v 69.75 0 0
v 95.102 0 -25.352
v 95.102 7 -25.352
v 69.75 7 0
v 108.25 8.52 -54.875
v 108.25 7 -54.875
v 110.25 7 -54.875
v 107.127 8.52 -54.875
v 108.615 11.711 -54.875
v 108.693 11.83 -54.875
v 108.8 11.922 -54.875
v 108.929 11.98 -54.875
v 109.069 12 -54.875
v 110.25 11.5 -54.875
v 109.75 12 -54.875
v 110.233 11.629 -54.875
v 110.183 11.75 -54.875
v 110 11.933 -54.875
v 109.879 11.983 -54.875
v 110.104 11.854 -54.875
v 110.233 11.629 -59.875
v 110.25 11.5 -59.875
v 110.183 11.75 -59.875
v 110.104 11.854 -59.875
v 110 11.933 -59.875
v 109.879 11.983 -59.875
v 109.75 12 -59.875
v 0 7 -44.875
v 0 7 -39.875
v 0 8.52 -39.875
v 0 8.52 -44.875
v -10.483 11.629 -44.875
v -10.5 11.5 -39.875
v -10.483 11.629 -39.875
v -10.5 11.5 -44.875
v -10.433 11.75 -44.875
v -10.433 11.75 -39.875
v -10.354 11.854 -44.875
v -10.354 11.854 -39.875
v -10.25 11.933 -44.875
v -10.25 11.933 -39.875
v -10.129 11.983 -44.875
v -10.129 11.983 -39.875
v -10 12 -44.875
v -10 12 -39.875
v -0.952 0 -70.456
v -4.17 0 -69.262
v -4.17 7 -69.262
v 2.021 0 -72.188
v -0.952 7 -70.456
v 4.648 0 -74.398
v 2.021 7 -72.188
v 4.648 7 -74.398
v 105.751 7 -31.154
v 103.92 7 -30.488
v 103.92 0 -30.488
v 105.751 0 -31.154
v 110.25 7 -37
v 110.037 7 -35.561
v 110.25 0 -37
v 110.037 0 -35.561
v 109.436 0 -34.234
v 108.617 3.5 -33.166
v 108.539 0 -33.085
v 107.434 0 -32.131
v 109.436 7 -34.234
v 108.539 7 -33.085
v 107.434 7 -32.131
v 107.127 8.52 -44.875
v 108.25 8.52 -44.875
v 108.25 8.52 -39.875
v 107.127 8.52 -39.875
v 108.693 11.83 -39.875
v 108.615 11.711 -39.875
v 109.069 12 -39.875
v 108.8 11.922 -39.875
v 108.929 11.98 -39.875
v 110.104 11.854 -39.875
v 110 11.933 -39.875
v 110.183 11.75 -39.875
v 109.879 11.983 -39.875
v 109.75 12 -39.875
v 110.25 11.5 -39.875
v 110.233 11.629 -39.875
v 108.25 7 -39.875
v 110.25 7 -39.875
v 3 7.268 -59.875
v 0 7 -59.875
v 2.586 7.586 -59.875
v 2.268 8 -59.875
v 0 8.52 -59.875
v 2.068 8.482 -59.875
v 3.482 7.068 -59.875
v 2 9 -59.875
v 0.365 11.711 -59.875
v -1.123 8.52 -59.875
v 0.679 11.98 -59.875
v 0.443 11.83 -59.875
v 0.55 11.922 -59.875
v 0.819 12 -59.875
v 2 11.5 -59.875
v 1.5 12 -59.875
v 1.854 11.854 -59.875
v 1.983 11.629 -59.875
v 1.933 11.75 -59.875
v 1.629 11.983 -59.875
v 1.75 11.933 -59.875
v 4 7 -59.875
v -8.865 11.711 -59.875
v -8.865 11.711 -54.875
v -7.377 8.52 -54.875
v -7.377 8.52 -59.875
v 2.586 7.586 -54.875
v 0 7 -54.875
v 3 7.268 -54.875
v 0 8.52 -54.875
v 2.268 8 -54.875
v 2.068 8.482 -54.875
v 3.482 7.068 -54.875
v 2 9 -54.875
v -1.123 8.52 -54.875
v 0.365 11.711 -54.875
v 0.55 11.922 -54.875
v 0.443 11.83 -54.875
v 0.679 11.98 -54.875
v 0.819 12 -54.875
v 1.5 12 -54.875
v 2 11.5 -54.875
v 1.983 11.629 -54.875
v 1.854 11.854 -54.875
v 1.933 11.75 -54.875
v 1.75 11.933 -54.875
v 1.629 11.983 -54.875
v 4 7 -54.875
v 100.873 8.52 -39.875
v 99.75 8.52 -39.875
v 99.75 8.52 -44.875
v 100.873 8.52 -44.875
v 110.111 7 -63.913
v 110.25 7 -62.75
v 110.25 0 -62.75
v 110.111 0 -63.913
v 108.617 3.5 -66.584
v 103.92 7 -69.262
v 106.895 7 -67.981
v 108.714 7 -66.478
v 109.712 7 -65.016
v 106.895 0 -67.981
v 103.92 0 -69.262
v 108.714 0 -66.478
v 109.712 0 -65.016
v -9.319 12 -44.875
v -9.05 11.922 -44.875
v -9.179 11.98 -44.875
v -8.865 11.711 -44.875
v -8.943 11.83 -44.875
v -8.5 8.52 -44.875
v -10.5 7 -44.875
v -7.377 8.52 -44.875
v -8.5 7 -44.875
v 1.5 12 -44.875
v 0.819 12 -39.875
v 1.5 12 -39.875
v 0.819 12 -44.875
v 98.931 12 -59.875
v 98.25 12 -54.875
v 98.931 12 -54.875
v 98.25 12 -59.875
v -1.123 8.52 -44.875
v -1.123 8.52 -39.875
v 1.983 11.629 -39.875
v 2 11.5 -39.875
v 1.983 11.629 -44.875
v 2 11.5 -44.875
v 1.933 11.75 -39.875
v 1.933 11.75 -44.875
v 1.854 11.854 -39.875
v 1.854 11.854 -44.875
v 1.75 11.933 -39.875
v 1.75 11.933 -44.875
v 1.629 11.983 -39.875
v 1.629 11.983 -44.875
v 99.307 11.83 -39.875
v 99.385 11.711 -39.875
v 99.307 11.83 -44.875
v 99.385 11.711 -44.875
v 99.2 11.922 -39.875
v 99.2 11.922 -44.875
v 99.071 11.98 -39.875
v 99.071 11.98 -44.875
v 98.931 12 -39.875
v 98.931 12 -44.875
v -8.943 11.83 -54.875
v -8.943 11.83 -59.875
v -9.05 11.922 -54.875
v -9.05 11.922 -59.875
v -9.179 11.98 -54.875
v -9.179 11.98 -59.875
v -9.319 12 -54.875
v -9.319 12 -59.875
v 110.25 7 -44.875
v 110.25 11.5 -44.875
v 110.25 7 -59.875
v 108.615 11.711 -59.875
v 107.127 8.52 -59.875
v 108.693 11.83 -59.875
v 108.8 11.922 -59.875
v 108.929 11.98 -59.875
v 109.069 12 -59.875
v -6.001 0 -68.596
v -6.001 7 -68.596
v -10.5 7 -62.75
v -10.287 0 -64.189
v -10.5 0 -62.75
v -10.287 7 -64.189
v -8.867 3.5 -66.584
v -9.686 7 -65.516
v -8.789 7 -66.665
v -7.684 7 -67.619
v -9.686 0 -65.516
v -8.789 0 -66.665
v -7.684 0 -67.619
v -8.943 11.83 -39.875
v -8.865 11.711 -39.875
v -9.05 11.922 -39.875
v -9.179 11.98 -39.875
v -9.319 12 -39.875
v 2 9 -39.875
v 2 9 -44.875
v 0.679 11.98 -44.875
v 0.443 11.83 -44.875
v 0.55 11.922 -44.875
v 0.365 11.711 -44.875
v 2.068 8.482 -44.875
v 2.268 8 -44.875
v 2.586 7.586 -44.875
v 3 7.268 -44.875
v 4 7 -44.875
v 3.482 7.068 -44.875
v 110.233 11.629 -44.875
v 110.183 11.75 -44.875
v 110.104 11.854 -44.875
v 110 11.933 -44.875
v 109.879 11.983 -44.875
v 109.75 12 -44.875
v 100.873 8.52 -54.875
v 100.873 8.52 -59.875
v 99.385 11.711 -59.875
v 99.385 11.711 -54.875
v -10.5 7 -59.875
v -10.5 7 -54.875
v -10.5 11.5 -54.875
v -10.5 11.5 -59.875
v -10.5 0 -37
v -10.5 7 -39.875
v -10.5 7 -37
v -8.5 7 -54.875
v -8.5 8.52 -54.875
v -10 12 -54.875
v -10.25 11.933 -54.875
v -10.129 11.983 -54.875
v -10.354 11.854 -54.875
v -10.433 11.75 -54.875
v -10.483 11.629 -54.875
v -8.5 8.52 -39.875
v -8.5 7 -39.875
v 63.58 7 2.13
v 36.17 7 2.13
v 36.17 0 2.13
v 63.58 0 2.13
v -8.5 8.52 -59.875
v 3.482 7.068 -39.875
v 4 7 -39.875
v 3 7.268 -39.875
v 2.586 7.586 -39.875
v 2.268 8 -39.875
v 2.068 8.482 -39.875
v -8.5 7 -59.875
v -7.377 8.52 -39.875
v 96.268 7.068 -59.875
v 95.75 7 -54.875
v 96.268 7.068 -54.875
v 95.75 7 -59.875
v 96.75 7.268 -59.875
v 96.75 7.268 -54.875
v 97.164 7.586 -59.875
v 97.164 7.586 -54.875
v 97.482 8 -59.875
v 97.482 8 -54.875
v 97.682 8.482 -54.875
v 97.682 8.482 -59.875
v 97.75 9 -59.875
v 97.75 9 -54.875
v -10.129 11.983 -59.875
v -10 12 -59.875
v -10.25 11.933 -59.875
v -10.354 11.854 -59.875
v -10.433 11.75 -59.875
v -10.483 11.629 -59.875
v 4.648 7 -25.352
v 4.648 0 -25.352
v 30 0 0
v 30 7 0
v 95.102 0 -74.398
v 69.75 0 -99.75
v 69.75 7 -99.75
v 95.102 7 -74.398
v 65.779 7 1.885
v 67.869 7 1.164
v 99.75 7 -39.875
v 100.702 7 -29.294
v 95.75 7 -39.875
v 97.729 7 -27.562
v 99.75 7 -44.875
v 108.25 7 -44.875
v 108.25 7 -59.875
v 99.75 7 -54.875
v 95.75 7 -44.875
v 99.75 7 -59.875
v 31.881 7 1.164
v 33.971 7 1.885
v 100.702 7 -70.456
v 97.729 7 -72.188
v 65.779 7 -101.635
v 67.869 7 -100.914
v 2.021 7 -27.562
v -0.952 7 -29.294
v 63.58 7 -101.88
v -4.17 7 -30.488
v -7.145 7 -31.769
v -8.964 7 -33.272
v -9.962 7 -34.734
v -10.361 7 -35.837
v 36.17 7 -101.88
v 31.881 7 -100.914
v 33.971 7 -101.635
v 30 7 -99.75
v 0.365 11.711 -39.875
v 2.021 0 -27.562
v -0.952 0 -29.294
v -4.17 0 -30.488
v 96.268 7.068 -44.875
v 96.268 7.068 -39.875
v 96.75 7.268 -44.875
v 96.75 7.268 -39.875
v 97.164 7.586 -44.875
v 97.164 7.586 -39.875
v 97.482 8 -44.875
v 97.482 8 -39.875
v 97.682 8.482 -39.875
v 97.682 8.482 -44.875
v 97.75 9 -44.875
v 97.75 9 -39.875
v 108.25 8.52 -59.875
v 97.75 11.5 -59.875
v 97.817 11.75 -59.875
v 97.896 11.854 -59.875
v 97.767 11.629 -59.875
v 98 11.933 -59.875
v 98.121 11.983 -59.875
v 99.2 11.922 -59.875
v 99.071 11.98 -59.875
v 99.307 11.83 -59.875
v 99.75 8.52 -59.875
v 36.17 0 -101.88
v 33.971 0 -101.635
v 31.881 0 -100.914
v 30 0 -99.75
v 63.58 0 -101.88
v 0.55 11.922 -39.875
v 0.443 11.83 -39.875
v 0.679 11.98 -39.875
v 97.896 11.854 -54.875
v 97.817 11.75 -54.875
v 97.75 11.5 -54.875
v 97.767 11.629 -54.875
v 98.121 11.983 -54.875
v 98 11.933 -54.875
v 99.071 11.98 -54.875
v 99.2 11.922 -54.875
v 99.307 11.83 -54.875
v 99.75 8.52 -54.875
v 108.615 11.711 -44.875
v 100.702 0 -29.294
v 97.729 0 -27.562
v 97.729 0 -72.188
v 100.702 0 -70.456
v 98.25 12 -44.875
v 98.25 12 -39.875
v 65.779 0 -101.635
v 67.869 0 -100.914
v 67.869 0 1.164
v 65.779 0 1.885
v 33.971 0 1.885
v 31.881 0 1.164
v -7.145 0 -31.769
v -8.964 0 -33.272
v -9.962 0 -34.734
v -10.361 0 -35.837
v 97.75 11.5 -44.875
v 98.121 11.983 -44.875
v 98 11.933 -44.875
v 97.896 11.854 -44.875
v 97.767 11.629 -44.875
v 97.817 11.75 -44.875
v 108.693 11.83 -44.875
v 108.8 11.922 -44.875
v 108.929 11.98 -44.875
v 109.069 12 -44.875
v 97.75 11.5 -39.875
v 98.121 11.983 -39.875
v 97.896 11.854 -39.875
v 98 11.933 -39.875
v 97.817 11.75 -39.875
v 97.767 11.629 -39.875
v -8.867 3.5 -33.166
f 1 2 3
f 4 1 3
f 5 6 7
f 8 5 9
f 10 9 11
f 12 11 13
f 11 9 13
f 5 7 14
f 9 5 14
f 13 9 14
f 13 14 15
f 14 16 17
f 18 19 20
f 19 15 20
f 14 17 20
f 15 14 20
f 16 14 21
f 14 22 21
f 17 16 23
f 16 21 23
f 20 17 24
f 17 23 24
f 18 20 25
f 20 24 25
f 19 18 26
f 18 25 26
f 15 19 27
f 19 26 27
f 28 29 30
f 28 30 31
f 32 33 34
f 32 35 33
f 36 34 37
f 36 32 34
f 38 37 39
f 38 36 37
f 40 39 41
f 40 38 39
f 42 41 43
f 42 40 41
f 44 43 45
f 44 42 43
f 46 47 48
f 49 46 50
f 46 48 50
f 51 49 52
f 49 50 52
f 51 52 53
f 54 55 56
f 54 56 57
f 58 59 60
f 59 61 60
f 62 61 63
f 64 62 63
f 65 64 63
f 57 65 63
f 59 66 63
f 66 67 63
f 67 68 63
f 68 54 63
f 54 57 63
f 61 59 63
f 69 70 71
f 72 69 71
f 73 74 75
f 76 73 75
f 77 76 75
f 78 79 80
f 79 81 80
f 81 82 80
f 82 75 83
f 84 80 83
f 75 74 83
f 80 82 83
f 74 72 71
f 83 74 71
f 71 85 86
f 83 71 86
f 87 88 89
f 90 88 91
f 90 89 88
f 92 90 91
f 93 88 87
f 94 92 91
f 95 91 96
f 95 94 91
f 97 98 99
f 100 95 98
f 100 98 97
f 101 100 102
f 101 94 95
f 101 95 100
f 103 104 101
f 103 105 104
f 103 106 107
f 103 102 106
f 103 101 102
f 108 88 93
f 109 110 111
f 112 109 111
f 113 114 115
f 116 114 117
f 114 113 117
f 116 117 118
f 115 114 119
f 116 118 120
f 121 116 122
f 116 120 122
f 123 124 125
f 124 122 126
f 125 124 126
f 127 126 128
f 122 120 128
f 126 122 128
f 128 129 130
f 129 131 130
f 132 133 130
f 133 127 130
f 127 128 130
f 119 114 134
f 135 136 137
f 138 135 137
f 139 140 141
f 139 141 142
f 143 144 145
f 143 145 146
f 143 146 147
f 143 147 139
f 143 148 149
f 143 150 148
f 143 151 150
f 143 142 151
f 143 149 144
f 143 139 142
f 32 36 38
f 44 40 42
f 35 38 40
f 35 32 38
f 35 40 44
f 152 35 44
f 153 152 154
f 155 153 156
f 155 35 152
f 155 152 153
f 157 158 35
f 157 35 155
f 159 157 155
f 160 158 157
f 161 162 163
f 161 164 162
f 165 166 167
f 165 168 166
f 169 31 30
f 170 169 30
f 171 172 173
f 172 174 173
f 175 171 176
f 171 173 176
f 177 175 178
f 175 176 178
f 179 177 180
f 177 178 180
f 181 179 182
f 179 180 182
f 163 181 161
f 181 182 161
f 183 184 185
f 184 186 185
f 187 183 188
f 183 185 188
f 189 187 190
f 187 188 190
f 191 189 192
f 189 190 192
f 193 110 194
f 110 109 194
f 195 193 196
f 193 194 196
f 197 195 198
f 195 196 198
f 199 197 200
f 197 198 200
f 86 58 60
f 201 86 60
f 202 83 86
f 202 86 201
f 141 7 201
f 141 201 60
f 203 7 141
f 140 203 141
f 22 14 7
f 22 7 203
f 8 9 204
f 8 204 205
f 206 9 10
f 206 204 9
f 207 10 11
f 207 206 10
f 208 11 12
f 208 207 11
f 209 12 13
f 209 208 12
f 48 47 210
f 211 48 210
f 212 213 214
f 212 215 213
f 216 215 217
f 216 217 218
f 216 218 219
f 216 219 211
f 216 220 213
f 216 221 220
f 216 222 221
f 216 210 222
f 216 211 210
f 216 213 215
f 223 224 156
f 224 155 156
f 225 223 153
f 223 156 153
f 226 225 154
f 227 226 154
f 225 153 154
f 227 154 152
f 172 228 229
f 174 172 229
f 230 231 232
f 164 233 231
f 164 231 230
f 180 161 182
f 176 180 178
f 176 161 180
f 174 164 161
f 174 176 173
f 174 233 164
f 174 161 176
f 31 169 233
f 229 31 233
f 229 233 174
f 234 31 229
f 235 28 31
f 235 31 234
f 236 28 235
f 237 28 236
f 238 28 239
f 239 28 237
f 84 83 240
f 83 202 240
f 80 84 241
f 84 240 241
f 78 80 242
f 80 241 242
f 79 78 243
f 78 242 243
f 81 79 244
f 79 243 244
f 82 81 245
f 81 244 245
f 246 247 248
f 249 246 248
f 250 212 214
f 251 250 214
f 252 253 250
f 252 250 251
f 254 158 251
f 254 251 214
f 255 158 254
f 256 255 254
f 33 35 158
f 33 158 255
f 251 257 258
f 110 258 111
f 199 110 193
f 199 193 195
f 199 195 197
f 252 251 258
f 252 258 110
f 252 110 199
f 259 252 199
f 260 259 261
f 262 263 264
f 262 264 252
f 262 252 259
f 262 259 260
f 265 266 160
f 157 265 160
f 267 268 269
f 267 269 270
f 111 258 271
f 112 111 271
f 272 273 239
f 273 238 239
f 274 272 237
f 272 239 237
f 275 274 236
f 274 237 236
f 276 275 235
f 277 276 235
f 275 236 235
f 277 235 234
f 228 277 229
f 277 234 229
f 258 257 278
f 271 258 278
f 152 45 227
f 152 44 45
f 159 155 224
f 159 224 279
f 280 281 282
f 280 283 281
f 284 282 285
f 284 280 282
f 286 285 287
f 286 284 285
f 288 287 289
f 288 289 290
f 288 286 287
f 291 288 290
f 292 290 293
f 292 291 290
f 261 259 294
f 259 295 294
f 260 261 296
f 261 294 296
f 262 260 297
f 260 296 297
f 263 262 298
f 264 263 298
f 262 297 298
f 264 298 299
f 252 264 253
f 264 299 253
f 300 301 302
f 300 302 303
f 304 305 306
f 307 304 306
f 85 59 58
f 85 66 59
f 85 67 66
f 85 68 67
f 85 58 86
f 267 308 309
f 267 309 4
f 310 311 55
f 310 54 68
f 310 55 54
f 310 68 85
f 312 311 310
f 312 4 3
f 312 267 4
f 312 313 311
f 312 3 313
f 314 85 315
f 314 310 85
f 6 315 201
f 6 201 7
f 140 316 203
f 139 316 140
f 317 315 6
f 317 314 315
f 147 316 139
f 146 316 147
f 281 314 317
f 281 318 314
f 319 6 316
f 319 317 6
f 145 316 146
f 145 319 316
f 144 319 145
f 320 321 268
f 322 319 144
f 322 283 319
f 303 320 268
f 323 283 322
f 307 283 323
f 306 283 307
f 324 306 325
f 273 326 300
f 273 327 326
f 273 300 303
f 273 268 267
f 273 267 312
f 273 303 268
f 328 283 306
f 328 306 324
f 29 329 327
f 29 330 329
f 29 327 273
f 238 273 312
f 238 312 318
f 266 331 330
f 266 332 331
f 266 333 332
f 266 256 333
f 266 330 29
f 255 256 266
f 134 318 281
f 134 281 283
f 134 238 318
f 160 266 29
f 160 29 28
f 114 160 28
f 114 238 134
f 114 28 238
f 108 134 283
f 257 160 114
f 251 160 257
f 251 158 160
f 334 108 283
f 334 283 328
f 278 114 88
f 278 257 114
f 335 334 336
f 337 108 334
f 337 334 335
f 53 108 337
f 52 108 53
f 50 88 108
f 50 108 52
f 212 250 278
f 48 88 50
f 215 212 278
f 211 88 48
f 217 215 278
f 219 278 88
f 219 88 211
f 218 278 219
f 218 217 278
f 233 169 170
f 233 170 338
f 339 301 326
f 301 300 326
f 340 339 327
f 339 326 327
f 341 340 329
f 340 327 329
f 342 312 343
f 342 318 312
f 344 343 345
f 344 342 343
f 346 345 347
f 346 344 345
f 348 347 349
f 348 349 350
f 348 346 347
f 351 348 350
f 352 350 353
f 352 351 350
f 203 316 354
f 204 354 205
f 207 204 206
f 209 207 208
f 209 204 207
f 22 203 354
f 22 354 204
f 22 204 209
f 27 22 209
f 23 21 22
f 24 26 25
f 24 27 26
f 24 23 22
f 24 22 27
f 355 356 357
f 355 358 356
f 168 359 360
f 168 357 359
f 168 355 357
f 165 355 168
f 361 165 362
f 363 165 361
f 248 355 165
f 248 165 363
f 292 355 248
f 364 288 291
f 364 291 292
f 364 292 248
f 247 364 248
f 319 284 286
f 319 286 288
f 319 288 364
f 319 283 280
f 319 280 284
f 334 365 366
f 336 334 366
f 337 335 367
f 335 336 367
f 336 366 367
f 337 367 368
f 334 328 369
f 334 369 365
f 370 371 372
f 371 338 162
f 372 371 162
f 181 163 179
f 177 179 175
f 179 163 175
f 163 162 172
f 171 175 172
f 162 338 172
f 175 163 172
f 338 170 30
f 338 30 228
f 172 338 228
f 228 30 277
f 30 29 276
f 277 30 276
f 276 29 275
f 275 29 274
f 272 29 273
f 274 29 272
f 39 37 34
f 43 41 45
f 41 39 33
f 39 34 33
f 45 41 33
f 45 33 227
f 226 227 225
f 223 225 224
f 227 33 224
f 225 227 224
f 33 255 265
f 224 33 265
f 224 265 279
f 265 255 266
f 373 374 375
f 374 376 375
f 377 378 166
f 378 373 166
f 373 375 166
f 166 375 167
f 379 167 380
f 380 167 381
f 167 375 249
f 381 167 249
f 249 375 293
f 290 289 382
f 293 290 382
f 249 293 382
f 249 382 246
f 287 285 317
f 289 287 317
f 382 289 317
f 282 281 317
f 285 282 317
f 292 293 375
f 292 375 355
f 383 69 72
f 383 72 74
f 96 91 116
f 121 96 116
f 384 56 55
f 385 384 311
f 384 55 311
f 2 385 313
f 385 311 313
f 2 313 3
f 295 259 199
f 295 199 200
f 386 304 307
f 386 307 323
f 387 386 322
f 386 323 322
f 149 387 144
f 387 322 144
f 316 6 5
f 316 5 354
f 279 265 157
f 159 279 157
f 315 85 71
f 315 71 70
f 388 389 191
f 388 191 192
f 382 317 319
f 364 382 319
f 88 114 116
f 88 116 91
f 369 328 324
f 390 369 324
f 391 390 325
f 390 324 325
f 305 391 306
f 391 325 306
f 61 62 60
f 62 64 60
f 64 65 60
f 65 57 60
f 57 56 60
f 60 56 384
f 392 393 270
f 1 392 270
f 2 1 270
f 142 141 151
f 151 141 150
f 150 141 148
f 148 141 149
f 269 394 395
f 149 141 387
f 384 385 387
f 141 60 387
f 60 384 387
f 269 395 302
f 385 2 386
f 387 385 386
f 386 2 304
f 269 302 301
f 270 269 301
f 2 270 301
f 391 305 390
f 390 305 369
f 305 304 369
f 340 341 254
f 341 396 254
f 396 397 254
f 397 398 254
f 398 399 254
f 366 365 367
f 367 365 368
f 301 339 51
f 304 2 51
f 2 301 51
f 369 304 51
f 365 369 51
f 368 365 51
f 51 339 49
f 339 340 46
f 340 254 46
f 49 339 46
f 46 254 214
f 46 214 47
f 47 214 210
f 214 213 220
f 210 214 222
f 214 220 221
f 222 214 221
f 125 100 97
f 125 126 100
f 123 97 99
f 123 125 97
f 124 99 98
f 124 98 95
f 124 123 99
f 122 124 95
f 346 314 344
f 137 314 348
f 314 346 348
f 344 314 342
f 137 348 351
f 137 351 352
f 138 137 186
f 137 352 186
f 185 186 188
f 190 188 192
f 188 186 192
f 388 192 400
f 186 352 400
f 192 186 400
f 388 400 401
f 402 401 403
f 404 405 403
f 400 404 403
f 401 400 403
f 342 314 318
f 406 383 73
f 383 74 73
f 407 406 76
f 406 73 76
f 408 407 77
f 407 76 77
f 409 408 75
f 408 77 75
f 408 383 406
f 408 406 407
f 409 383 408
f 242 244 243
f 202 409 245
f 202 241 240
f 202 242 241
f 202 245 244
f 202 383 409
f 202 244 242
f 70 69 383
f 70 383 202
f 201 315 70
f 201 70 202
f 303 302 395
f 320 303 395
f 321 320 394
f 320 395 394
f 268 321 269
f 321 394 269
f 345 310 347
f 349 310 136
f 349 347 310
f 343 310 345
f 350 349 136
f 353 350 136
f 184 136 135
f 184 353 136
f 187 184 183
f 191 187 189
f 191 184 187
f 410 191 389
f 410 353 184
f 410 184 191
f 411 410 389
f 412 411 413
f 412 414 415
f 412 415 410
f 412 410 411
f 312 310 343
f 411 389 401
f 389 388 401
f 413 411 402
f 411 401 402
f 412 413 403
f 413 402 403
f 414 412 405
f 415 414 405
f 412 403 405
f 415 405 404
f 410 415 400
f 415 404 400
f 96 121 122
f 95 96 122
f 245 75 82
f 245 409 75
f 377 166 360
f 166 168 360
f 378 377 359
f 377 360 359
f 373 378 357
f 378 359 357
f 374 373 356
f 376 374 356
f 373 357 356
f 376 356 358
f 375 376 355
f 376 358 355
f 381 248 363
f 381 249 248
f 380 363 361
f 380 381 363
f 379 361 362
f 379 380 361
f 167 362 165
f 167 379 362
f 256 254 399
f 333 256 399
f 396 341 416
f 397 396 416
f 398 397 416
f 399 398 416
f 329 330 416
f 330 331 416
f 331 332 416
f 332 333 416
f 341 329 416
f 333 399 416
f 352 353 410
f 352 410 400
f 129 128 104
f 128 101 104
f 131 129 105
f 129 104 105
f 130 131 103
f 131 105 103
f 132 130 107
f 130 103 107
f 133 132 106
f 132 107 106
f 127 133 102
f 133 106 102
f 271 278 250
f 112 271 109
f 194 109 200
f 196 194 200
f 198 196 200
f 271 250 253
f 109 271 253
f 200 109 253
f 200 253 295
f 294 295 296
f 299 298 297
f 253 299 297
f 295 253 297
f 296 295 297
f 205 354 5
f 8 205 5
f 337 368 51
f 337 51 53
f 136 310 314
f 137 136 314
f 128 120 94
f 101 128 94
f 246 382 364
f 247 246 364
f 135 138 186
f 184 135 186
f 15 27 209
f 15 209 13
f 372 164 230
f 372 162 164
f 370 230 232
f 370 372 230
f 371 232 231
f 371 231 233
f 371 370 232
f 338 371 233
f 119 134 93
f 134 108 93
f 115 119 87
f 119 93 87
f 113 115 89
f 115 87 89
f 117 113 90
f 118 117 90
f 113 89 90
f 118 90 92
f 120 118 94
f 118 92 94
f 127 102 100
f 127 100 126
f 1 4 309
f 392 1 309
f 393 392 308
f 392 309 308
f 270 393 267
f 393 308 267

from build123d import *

# Parameters (mm, degrees)
SKETCH1_W            = 99.75
SKETCH1_H            = 99.75
BOSS_EXTRUDE5_DEPTH  = 7
CHAMFER2_SIZE        = 30
SKETCH6_W            = 39.75
SKETCH6_H            = 7
BOSS_EXTRUDE7_DEPTH  = 2.13
SKETCH8_W            = 39.75
SKETCH8_H            = 7
BOSS_EXTRUDE10_DEPTH = 2.13
SKETCH12_W           = 39.75
SKETCH12_H           = 7
BOSS_EXTRUDE14_DEPTH = 10.5
SKETCH14_W           = 39.75
SKETCH14_H           = 7
BOSS_EXTRUDE16_DEPTH = 10.5
SKETCH15_W           = 2
SKETCH15_H           = 5
BOSS_EXTRUDE17_DEPTH = 5
FILLET5_R            = 2
SKETCH16_W           = 5
SKETCH16_H           = 3.48
BOSS_EXTRUDE18_DEPTH = 2
SKETCH17_W           = 5
SKETCH17_H           = 3.48
BOSS_EXTRUDE19_DEPTH = 2
SKETCH18_W           = 5
SKETCH18_H           = 3.48
BOSS_EXTRUDE20_DEPTH = 2
SKETCH19_W           = 5
SKETCH19_H           = 3.48
BOSS_EXTRUDE21_DEPTH = 2
CHAMFER6_SIZE        = 5.361267301
CHAMFER6_SIZE_2      = 2.5
CHAMFER7_SIZE        = 5.361267301
CHAMFER7_SIZE_2      = 2.5
FILLET6_R            = 0.5
FILLET7_SIZE         = 10
FILLET7_SIZE_2       = 7
FILLET8_R            = 20
FILLET9_R            = 10


with BuildPart() as part:
    # Sketch1 → Boss-Extrude5 (new body)
    with BuildSketch(Plane(origin=(0, 0, 0), x_dir=(1, 0, 0), z_dir=(0, 1, 0))):
        with Locations((49.875, 49.875)):
            Rectangle(SKETCH1_W, SKETCH1_H)
    extrude(amount=BOSS_EXTRUDE5_DEPTH)

    # Chamfer2
    chamfer2_edges = [part.edges().sort_by_distance(p)[0] for p in [
        (0, 3.5, -99.75),
        (99.75, 3.5, -99.75),
        (99.75, 3.5, 0),
        (0, 3.5, 0),
    ]]
    chamfer(chamfer2_edges, length=CHAMFER2_SIZE)

    # Sketch6 → Boss-Extrude7 (add)
    with BuildSketch(Plane.XY):
        with Locations((49.875, 3.5)):
            Rectangle(SKETCH6_W, SKETCH6_H)
    extrude(amount=BOSS_EXTRUDE7_DEPTH)

    # Sketch8 → Boss-Extrude10 (add)
    with BuildSketch(Plane(origin=(0, 0, -99.75), x_dir=(-1, 0, 0), z_dir=(0, 0, -1))):
        with Locations((-49.875, 3.5)):
            Rectangle(SKETCH8_W, SKETCH8_H)
    extrude(amount=BOSS_EXTRUDE10_DEPTH)

    # Sketch12 → Boss-Extrude14 (add)
    with BuildSketch(Plane.ZY):
        with Locations((-49.875, 3.5)):
            Rectangle(SKETCH12_W, SKETCH12_H)
    extrude(amount=BOSS_EXTRUDE14_DEPTH)

    # Sketch14 → Boss-Extrude16 (add)
    with BuildSketch(Plane(origin=(99.75, 0, 0), x_dir=(0, 0, -1), z_dir=(1, 0, 0))):
        with Locations((49.875, 3.5)):
            Rectangle(SKETCH14_W, SKETCH14_H)
    extrude(amount=BOSS_EXTRUDE16_DEPTH)

    # Sketch15 → Boss-Extrude17 (add)
    with BuildSketch(Plane(origin=(0, 7, 0), x_dir=(1, 0, 0), z_dir=(0, 1, 0))):
        with Locations((1, 42.375)):
            Rectangle(SKETCH15_W, SKETCH15_H)
        with Locations((1, 57.375)):
            Rectangle(SKETCH15_W, SKETCH15_H)
        with Locations((-9.5, 57.375)):
            Rectangle(SKETCH15_W, SKETCH15_H)
        with Locations((-9.5, 42.375)):
            Rectangle(SKETCH15_W, SKETCH15_H)
        with Locations((109.25, 42.375)):
            Rectangle(SKETCH15_W, SKETCH15_H)
        with Locations((109.25, 57.375)):
            Rectangle(SKETCH15_W, SKETCH15_H)
        with Locations((98.75, 57.375)):
            Rectangle(SKETCH15_W, SKETCH15_H)
        with Locations((98.75, 42.375)):
            Rectangle(SKETCH15_W, SKETCH15_H)
    extrude(amount=BOSS_EXTRUDE17_DEPTH)

    # Fillet5
    fillet5_edges = [part.edges().sort_by_distance(p)[0] for p in [
        (2, 7, -57.375),
        (97.75, 7, -57.375),
        (97.75, 7, -42.375),
        (2, 7, -42.375),
    ]]
    fillet(fillet5_edges, radius=FILLET5_R)

    # Sketch16 → Boss-Extrude18 (add)
    with BuildSketch(Plane(origin=(99.75, 0, 0), x_dir=(0, 0, -1), z_dir=(1, 0, 0))):
        with Locations((42.375, 10.26)):
            Rectangle(SKETCH16_W, SKETCH16_H)
        with Locations((57.375, 10.26)):
            Rectangle(SKETCH16_W, SKETCH16_H)
    extrude(amount=BOSS_EXTRUDE18_DEPTH)

    # Sketch17 → Boss-Extrude19 (add)
    with BuildSketch(Plane.ZY.offset(-108.25)):
        with Locations((-57.375, 10.26)):
            Rectangle(SKETCH17_W, SKETCH17_H)
        with Locations((-42.375, 10.26)):
            Rectangle(SKETCH17_W, SKETCH17_H)
    extrude(amount=BOSS_EXTRUDE19_DEPTH)

    # Sketch18 → Boss-Extrude20 (add)
    with BuildSketch(Plane.ZY):
        with Locations((-57.375, 10.26)):
            Rectangle(SKETCH18_W, SKETCH18_H)
        with Locations((-42.375, 10.26)):
            Rectangle(SKETCH18_W, SKETCH18_H)
    extrude(amount=BOSS_EXTRUDE20_DEPTH)

    # Sketch19 → Boss-Extrude21 (add)
    with BuildSketch(Plane(origin=(-8.5, 0, 0), x_dir=(0, 0, -1), z_dir=(1, 0, 0))):
        with Locations((57.375, 10.26)):
            Rectangle(SKETCH19_W, SKETCH19_H)
        with Locations((42.375, 10.26)):
            Rectangle(SKETCH19_W, SKETCH19_H)
    extrude(amount=BOSS_EXTRUDE21_DEPTH)

    # Chamfer6
    # the kernel refuses this chamfer: 5.361267301, 2.5 mm, written as the material it takes off along each edge
    with BuildSketch(Plane(origin=(106.25, 12, -44.875), x_dir=(-0.016311164131111014, -0.9998669641130703, 0), z_dir=(0, 0, 1))) as chamfer6_piece_1_section:
        Polygon((CHAMFER6_SIZE * 0.999866964164, CHAMFER6_SIZE * 0.0163111641319), (-CHAMFER6_SIZE_2 * 0.0163111641311, CHAMFER6_SIZE_2 * 0.999866964113), (0, 0), align=None)
    chamfer6_piece_1 = extrude(amount=18.890912073, mode=Mode.PRIVATE)
    chamfer6_piece_1 = split(chamfer6_piece_1, bisect_by=Plane(origin=(107.159289271, 8.52, -42.375), z_dir=(0, 1, 0)), keep=Keep.TOP, mode=Mode.PRIVATE)
    add(chamfer6_piece_1, mode=Mode.SUBTRACT)

    # Chamfer7
    # the kernel refuses this chamfer: 5.361267301, 2.5 mm, written as the material it takes off along each edge
    with BuildSketch(Plane(origin=(101.75, 12, -58.765912073), x_dir=(0.016311164131111014, -0.9998669641130703, 0), z_dir=(0, 0, 1))) as chamfer7_piece_1_section:
        Polygon((CHAMFER7_SIZE * 0.999866964164, -CHAMFER7_SIZE * 0.0163111641319), (-CHAMFER7_SIZE_2 * 0.0163111641311, -CHAMFER7_SIZE_2 * 0.999866964113), (0, 0), align=None)
    chamfer7_piece_1 = extrude(amount=32.781824147, mode=Mode.PRIVATE)
    chamfer7_piece_1 = split(chamfer7_piece_1, bisect_by=Plane(origin=(100.840710729, 8.52, -56.820456037), z_dir=(0, 1, 0)), keep=Keep.TOP, mode=Mode.PRIVATE)
    add(chamfer7_piece_1, mode=Mode.SUBTRACT)
    with BuildSketch(Plane(origin=(101.75, 12, -40.984087927), x_dir=(0.016311164131111014, -0.9998669641130703, 0), z_dir=(0, 0, -1))) as chamfer7_piece_2_section:
        Polygon((CHAMFER7_SIZE * 0.999866964164, CHAMFER7_SIZE * 0.0163111641319), (-CHAMFER7_SIZE_2 * 0.0163111641311, CHAMFER7_SIZE_2 * 0.999866964113), (0, 0), align=None)
    chamfer7_piece_2 = extrude(amount=32.781824147, mode=Mode.PRIVATE)
    chamfer7_piece_2 = split(chamfer7_piece_2, bisect_by=Plane(origin=(100.840710729, 8.52, -42.929543963), z_dir=(0, 1, 0)), keep=Keep.TOP, mode=Mode.PRIVATE)
    add(chamfer7_piece_2, mode=Mode.SUBTRACT)
    with BuildSketch(Plane(origin=(106.25, 12, -40.984087927), x_dir=(0.9971975577536774, 0.07481330637060021, 0), z_dir=(0, 0, -1))) as chamfer7_piece_3_section:
        Polygon((CHAMFER7_SIZE_2 * 0.997197557754, CHAMFER7_SIZE_2 * 0.0748133063706), (-CHAMFER7_SIZE * 0.0748133063744, CHAMFER7_SIZE * 0.997197557805), (0, 0), align=None)
    chamfer7_piece_3 = extrude(amount=32.781824147, mode=Mode.PRIVATE)
    chamfer7_piece_3 = split(chamfer7_piece_3, bisect_by=Plane(origin=(107.159289271, 8.52, -57.375), z_dir=(0, 1, 0)), keep=Keep.TOP, mode=Mode.PRIVATE)
    add(chamfer7_piece_3, mode=Mode.SUBTRACT)
    with BuildSketch(Plane(origin=(-2, 12, -40.984087927), x_dir=(-0.016311164131110216, -0.9998669641130703, 0), z_dir=(0, 0, -1))) as chamfer7_piece_4_section:
        Polygon((CHAMFER7_SIZE * 0.999866964164, -CHAMFER7_SIZE * 0.0163111641319), (-CHAMFER7_SIZE_2 * 0.0163111641311, -CHAMFER7_SIZE_2 * 0.999866964113), (0, 0), align=None)
    chamfer7_piece_4 = extrude(amount=32.781824147, mode=Mode.PRIVATE)
    chamfer7_piece_4 = split(chamfer7_piece_4, bisect_by=Plane(origin=(-1.090710729, 8.52, -42.929543963), z_dir=(0, 1, 0)), keep=Keep.TOP, mode=Mode.PRIVATE)
    add(chamfer7_piece_4, mode=Mode.SUBTRACT)
    with BuildSketch(Plane(origin=(-2, 12, -58.765912073), x_dir=(-0.016311164131110216, -0.9998669641130703, 0), z_dir=(0, 0, 1))) as chamfer7_piece_5_section:
        Polygon((CHAMFER7_SIZE * 0.999866964164, CHAMFER7_SIZE * 0.0163111641319), (-CHAMFER7_SIZE_2 * 0.0163111641311, CHAMFER7_SIZE_2 * 0.999866964113), (0, 0), align=None)
    chamfer7_piece_5 = extrude(amount=32.781824147, mode=Mode.PRIVATE)
    chamfer7_piece_5 = split(chamfer7_piece_5, bisect_by=Plane(origin=(-1.090710729, 8.52, -56.820456037), z_dir=(0, 1, 0)), keep=Keep.TOP, mode=Mode.PRIVATE)
    add(chamfer7_piece_5, mode=Mode.SUBTRACT)
    with BuildSketch(Plane(origin=(-6.5, 12, -40.984087927), x_dir=(-0.9971975577536774, 0.07481330637060031, 0), z_dir=(0, 0, -1))) as chamfer7_piece_6_section:
        Polygon((CHAMFER7_SIZE_2 * 0.997197557754, -CHAMFER7_SIZE_2 * 0.0748133063706), (-CHAMFER7_SIZE * 0.0748133063744, -CHAMFER7_SIZE * 0.997197557805), (0, 0), align=None)
    chamfer7_piece_6 = extrude(amount=32.781824147, mode=Mode.PRIVATE)
    chamfer7_piece_6 = split(chamfer7_piece_6, bisect_by=Plane(origin=(-7.409289271, 8.52, -42.929543963), z_dir=(0, 1, 0)), keep=Keep.TOP, mode=Mode.PRIVATE)
    add(chamfer7_piece_6, mode=Mode.SUBTRACT)
    with BuildSketch(Plane(origin=(-6.5, 12, -25.984087927), x_dir=(-0.9971975577536774, 0.07481330637060031, 0), z_dir=(0, 0, -1))) as chamfer7_piece_7_section:
        Polygon((CHAMFER7_SIZE_2 * 0.997197557754, -CHAMFER7_SIZE_2 * 0.0748133063706), (-CHAMFER7_SIZE * 0.0748133063744, -CHAMFER7_SIZE * 0.997197557805), (0, 0), align=None)
    chamfer7_piece_7 = extrude(amount=32.781824147, mode=Mode.PRIVATE)
    chamfer7_piece_7 = split(chamfer7_piece_7, bisect_by=Plane(origin=(-7.409289271, 8.52, -42.375), z_dir=(0, 1, 0)), keep=Keep.TOP, mode=Mode.PRIVATE)
    add(chamfer7_piece_7, mode=Mode.SUBTRACT)

    # Fillet6
    fillet6_edges = [part.edges().sort_by_distance(p)[0] for p in [
        (2, 12, -57.375),
        (-10.5, 12, -57.375),
        (-10.5, 12, -42.375),
        (110.25, 12, -42.375),
        (110.25, 12, -57.375),
        (97.75, 12, -57.375),
        (97.75, 12, -42.375),
        (108.75, 12, -42.375),
        (-9, 12, -42.375),
        (-9, 12, -57.375),
        (0.5, 12, -57.375),
        (0.5, 12, -42.375),
        (99.25, 12, -42.375),
        (99.25, 12, -57.375),
        (108.75, 12, -57.375),
        (2, 12, -42.375),
    ]]
    fillet(fillet6_edges, radius=FILLET6_R)

    # Fillet7
    # an asymmetric fillet: 10, 7 mm, written as the material it takes off along each edge
    with BuildSketch(Plane(origin=(-10.5, 32, -69.75), x_dir=(1, 0, 0), z_dir=(0, -1, 0))) as fillet7_piece_1:
        with BuildLine():
            Bezier((FILLET7_SIZE, 0), (0, 0), (0, FILLET7_SIZE_2), weights=[1, 0.707106781, 1])
            Line((0, FILLET7_SIZE_2), (0, 0))
            Line((0, 0), (FILLET7_SIZE, 0))
        make_face()
    extrude(amount=57, mode=Mode.SUBTRACT)
    with BuildSketch(Plane(origin=(-10.5, -25, -30), x_dir=(0, 0, -1), z_dir=(0, 1, 0))) as fillet7_piece_2:
        with BuildLine():
            Bezier((FILLET7_SIZE_2, 0), (0, 0), (0, -FILLET7_SIZE), weights=[1, 0.707106781, 1])
            Line((0, -FILLET7_SIZE), (0, 0))
            Line((0, 0), (FILLET7_SIZE_2, 0))
        make_face()
    extrude(amount=57, mode=Mode.SUBTRACT)
    with BuildSketch(Plane(origin=(110.25, 32, -69.75), x_dir=(0, 0, 1), z_dir=(0, -1, 0))) as fillet7_piece_3:
        with BuildLine():
            Bezier((FILLET7_SIZE_2, 0), (0, 0), (0, FILLET7_SIZE), weights=[1, 0.707106781, 1])
            Line((0, FILLET7_SIZE), (0, 0))
            Line((0, 0), (FILLET7_SIZE_2, 0))
        make_face()
    extrude(amount=57, mode=Mode.SUBTRACT)
    with BuildSketch(Plane(origin=(110.25, -25, -30), x_dir=(-1, 0, 0), z_dir=(0, 1, 0))) as fillet7_piece_4:
        with BuildLine():
            Bezier((FILLET7_SIZE, 0), (0, 0), (0, -FILLET7_SIZE_2), weights=[1, 0.707106781, 1])
            Line((0, -FILLET7_SIZE_2), (0, 0))
            Line((0, 0), (FILLET7_SIZE, 0))
        make_face()
    extrude(amount=57, mode=Mode.SUBTRACT)

    # Fillet8
    fillet8_edges = [part.edges().sort_by_distance(p)[0] for p in [
        (0, 3.5, -30),
        (0, 3.5, -69.75),
        (99.75, 3.5, -69.75),
        (99.75, 3.5, -30),
    ]]
    fillet(fillet8_edges, radius=FILLET8_R)

    # Fillet9
    # the kernel refuses this fillet: 10 mm, written as the material it takes off along each edge
    with BuildSketch(Plane(origin=(30, -15.423824915, 2.13), x_dir=(0, 0, -1), z_dir=(0, 1, 0))) as fillet9_piece_1:
        with BuildLine():
            CenterArc((10, -6.169529966), FILLET9_R, 141.906034037, 38.093965963)
            Line((0, -6.169529966), (-0.2, -6.169529966))
            Line((-0.2, -6.169529966), (-0.2, 0))
            Line((-0.2, 0), (0, 0.2))
            ThreePointArc((0, 0.2), (1.065, 0.2), (1.9726, 0.123390599))
            Line((1.9726, 0.123390599), (2.13, 0))
        make_face()
    extrude(amount=37.847649829, mode=Mode.SUBTRACT)
    with BuildSketch(Plane(origin=(69.75, 22.423824915, 2.13), x_dir=(-1, 0, 0), z_dir=(0, -1, 0))) as fillet9_piece_2:
        with BuildLine():
            CenterArc((6.169529966, 10), FILLET9_R, 231.906034037, 38.093965963)
            Line((0, 2.13), (-0.123390599, 1.9726))
            ThreePointArc((-0.123390599, 1.9726), (-0.2, 1.065), (-0.2, 0))
            Line((-0.2, 0), (0, -0.2))
            Line((0, -0.2), (6.169529966, -0.2))
            Line((6.169529966, -0.2), (6.169529966, 0))
        make_face()
    extrude(amount=37.847649829, mode=Mode.SUBTRACT)
    with BuildSketch(Plane(origin=(30, -15.423824915, -101.88), x_dir=(0, 0, 1), z_dir=(0, 1, 0))) as fillet9_piece_3:
        with BuildLine():
            CenterArc((10, 6.169529966), FILLET9_R, 180, 38.093965963)
            Line((0, 6.169529966), (-0.2, 6.169529966))
            Line((-0.2, 6.169529966), (-0.2, 0))
            Line((-0.2, 0), (0, -0.2))
            ThreePointArc((0, -0.2), (1.065, -0.2), (1.9726, -0.123390599))
            Line((1.9726, -0.123390599), (2.13, 0))
        make_face()
    extrude(amount=37.847649829, mode=Mode.SUBTRACT)
    with BuildSketch(Plane(origin=(69.75, 22.423824915, -101.88), x_dir=(-1, 0, 0), z_dir=(0, -1, 0))) as fillet9_piece_4:
        with BuildLine():
            CenterArc((6.169529966, -10), FILLET9_R, 90, 38.093965963)
            Line((0, -2.13), (-0.123390599, -1.9726))
            ThreePointArc((-0.123390599, -1.9726), (-0.2, -1.065), (-0.2, 0))
            Line((-0.2, 0), (0, 0.2))
            Line((0, 0.2), (6.169529966, 0.2))
            Line((6.169529966, 0.2), (6.169529966, 0))
        make_face()
    extrude(amount=37.847649829, mode=Mode.SUBTRACT)


solid = part.part
